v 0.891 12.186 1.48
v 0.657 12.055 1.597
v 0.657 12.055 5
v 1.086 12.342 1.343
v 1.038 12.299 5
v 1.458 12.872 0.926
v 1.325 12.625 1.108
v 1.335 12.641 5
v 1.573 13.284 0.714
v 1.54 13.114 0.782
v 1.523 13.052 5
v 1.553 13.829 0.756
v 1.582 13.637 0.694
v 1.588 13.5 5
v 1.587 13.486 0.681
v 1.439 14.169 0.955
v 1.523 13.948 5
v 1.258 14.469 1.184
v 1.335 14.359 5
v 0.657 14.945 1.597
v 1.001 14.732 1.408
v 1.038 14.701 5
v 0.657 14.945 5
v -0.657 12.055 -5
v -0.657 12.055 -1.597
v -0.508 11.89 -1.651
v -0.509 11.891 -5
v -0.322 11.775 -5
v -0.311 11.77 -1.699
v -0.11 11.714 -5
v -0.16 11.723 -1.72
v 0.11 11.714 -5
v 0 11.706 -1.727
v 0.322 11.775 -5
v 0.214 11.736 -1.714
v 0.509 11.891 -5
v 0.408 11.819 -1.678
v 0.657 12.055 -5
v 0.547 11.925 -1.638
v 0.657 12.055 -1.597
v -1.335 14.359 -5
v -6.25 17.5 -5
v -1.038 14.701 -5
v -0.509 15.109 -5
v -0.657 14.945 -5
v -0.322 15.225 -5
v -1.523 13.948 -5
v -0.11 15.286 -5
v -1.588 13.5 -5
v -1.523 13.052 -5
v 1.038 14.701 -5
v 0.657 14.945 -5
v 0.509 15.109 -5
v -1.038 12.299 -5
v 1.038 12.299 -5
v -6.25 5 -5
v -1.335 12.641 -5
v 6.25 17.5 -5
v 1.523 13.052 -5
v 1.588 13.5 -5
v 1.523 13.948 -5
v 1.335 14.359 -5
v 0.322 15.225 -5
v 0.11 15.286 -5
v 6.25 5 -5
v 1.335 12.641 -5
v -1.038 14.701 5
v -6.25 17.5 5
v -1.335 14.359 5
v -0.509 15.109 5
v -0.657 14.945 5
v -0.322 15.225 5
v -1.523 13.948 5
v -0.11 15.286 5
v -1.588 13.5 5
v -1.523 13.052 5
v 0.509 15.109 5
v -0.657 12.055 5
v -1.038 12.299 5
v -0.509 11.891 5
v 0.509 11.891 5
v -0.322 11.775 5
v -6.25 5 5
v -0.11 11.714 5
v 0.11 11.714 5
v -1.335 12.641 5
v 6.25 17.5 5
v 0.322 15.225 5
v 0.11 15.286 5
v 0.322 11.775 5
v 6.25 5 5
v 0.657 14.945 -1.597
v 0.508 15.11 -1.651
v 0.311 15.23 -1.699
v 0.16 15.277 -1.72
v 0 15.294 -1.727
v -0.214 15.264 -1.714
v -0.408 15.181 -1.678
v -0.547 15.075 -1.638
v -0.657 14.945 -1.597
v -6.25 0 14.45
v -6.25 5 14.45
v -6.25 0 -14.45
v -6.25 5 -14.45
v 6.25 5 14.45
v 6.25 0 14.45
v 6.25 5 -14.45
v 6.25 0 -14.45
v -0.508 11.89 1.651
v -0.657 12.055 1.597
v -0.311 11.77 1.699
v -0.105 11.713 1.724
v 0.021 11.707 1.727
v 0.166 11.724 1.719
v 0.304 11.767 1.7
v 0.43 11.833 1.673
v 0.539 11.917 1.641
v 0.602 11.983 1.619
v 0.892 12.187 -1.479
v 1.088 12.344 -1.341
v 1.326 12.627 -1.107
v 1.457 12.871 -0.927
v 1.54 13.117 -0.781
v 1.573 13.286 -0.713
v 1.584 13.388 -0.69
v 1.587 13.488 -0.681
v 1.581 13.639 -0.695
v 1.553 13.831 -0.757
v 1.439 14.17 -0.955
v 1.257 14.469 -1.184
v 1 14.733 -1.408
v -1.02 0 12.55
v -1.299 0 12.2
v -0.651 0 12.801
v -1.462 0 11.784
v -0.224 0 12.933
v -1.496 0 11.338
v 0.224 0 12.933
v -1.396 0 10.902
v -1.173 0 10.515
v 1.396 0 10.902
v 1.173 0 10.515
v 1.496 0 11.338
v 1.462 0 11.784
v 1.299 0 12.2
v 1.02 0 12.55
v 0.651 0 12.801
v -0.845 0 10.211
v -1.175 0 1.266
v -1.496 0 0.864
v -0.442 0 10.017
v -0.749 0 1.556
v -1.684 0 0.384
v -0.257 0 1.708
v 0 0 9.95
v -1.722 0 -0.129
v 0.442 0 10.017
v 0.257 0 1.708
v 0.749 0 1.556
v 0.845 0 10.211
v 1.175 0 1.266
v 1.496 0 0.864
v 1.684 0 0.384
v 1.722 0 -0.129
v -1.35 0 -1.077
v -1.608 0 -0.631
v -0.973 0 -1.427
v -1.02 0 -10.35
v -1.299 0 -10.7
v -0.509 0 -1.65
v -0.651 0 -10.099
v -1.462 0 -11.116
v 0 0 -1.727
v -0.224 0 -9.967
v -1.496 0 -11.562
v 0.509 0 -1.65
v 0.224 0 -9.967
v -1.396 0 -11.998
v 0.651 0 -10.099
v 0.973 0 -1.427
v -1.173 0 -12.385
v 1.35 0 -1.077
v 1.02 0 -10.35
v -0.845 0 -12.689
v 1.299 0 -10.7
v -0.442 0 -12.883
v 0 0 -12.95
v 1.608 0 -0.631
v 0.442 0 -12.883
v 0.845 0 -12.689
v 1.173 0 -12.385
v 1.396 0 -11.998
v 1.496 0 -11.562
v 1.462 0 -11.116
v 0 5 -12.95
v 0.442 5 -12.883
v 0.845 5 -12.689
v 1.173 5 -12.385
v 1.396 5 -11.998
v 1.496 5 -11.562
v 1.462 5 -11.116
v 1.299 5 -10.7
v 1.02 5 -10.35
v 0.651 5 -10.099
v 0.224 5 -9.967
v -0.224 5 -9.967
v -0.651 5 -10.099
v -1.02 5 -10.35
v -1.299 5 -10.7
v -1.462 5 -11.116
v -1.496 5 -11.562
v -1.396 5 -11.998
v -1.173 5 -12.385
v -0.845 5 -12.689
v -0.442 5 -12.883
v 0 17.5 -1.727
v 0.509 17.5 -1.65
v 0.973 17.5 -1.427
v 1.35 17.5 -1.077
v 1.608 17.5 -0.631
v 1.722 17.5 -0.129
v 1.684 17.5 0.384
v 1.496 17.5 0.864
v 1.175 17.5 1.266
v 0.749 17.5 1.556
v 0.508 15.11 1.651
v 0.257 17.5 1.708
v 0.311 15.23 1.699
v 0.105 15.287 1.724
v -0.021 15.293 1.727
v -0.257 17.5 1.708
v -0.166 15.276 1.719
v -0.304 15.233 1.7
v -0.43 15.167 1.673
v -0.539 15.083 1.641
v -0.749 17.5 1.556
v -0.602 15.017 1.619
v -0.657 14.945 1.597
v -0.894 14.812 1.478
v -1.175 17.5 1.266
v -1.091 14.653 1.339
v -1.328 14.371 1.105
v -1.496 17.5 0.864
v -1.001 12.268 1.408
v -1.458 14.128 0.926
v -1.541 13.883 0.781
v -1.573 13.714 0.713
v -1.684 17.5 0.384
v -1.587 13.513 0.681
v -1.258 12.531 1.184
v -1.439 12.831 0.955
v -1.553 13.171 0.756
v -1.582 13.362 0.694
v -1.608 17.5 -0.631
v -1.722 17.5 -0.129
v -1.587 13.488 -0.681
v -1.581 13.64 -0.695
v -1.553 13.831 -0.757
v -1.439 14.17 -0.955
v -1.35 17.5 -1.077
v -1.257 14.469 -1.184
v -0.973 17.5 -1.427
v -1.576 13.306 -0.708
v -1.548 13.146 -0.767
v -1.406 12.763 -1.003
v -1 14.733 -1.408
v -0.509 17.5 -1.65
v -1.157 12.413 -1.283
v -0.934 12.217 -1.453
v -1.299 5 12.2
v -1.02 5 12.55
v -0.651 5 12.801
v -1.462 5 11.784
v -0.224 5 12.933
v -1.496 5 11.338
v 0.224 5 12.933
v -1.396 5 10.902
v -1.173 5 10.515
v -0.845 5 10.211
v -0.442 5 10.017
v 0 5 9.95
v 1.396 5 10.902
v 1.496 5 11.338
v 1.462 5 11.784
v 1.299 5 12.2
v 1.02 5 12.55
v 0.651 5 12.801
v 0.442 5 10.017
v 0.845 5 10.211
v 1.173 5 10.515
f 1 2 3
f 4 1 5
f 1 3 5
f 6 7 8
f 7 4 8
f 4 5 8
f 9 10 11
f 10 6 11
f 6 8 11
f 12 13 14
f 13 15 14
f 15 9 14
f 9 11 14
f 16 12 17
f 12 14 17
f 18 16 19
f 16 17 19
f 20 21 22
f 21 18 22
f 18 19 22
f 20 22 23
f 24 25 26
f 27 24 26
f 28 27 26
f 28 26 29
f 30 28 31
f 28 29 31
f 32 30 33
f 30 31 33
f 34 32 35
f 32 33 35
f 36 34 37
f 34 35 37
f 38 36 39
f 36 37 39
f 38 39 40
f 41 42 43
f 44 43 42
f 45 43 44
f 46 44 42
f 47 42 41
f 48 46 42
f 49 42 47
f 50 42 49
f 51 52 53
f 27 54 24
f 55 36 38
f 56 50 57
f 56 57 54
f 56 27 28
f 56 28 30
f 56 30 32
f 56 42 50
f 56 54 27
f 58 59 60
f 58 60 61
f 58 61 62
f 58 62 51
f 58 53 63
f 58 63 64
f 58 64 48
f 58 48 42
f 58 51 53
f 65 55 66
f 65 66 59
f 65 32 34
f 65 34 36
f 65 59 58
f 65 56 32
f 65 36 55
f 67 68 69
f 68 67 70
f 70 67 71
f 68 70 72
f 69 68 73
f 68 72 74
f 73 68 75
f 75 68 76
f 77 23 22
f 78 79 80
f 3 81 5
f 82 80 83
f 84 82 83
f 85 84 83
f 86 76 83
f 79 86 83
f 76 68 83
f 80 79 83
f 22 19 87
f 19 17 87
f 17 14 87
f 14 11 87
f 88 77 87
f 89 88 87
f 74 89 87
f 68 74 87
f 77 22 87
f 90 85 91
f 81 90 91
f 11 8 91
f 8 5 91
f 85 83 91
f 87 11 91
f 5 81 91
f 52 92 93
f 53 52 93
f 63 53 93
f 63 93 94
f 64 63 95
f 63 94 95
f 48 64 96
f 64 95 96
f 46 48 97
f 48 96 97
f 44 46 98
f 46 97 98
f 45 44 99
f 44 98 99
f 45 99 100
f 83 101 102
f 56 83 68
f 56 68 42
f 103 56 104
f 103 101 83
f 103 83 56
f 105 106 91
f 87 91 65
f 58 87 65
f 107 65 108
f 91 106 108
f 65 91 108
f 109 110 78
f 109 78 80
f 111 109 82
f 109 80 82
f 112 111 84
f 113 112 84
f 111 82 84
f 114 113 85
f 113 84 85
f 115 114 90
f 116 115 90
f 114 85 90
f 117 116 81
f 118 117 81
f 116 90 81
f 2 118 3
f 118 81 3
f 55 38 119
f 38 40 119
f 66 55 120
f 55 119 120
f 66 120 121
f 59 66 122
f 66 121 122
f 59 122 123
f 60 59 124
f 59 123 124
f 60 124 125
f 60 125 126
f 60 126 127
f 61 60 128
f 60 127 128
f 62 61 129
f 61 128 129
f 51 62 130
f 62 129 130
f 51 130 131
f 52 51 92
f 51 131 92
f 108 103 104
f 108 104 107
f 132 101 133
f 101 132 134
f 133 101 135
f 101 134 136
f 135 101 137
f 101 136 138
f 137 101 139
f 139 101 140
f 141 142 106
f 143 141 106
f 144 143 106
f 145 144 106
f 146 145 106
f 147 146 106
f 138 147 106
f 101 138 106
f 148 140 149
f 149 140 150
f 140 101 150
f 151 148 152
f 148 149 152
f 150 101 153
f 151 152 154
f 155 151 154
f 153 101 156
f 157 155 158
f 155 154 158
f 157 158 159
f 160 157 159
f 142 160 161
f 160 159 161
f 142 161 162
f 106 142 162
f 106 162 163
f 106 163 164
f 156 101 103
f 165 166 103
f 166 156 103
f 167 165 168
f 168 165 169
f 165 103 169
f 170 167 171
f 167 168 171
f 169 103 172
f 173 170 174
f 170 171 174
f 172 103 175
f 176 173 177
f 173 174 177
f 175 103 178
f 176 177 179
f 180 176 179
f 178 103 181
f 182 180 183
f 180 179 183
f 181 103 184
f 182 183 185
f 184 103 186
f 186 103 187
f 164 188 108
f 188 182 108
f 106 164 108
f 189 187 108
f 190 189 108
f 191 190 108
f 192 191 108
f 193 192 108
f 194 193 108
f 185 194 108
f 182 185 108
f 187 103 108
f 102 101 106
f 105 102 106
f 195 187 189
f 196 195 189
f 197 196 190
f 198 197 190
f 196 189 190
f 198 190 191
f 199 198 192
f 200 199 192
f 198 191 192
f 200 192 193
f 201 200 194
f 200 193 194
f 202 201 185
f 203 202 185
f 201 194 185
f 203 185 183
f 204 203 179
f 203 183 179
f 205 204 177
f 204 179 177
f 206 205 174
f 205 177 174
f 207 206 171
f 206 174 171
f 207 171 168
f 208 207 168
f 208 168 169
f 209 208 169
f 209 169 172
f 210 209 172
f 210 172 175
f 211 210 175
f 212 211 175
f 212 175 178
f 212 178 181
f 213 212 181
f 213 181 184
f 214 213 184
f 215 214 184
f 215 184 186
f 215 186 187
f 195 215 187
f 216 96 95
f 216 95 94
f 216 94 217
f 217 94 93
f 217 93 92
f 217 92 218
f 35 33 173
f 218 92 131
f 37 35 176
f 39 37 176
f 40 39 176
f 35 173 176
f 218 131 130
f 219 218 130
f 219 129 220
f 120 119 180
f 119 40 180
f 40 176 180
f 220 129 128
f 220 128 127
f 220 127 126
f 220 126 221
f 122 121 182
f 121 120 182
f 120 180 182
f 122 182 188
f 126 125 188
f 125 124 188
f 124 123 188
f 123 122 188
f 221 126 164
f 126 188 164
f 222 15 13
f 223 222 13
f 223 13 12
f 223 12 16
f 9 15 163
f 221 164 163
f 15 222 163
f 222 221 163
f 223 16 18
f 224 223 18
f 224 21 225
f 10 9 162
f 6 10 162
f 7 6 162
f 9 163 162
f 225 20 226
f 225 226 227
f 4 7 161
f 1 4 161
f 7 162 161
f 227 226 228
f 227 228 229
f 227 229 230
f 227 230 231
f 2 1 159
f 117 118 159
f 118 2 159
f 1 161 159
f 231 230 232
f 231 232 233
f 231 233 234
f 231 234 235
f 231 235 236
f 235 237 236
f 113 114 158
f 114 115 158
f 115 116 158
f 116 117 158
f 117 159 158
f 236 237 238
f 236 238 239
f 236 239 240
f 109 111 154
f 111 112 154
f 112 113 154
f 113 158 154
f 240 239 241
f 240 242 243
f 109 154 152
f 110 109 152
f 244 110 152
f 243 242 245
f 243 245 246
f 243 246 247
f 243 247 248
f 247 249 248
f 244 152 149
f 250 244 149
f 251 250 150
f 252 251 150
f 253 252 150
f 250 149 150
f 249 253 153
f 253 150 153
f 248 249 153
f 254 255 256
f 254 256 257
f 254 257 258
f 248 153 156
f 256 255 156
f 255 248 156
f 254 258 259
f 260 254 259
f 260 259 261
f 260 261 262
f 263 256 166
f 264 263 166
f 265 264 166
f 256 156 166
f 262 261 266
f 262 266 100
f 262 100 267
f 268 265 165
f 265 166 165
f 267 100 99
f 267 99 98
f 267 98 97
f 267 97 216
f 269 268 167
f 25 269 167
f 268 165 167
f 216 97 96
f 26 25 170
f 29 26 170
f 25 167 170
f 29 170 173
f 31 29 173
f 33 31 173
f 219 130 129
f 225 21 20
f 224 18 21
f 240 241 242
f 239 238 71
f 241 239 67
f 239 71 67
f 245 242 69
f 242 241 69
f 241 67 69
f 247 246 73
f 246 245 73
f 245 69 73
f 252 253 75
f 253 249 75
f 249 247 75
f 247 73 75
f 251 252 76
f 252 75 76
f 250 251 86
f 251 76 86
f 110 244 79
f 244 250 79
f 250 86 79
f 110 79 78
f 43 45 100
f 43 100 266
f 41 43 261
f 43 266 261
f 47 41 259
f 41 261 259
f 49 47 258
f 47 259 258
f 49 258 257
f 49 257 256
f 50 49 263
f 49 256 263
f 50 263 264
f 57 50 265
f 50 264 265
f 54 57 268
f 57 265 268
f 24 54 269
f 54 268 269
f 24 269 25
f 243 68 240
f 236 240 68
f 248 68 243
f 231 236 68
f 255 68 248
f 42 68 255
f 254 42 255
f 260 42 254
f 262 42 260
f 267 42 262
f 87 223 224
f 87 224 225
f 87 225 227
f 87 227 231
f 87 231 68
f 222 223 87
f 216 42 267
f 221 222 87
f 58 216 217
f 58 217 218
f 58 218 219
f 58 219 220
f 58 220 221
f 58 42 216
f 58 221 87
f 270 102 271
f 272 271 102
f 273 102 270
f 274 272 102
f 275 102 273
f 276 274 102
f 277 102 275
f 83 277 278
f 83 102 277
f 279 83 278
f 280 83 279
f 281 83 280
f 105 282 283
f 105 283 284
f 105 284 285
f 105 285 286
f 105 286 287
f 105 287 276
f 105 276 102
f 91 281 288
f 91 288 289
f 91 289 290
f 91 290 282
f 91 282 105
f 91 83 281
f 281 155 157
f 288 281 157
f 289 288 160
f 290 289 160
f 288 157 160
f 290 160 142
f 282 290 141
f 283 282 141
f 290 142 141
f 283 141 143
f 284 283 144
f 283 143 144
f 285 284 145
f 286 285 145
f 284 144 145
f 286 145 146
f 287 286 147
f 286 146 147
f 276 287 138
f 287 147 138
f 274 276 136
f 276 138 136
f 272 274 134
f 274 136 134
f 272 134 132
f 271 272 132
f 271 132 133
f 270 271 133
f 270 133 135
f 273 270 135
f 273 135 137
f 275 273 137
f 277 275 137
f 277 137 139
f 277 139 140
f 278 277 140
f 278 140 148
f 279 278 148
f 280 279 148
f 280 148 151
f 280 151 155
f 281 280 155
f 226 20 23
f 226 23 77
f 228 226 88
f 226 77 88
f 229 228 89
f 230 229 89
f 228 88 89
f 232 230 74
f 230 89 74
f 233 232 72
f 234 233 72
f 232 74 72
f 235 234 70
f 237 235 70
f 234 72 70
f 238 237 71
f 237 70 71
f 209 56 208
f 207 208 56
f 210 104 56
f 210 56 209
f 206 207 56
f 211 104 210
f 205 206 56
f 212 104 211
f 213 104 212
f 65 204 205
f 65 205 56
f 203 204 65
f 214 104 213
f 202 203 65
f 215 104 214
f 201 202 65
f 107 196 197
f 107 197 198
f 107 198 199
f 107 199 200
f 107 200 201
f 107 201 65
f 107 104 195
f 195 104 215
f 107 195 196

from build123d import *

# Parameters (mm, degrees)
SKETCH1_W                          = 12.5
SKETCH1_H                          = 28.9
EXTRUDE1_DEPTH                     = 5
F_3_0_3_DIAMETER_HOLE1_D           = 3
SKETCH5_W                          = 12.5
SKETCH5_H                          = 10
EXTRUDE3_DEPTH                     = 12.5
F_1_8_0_125_DIAMETER_HOLE1_D       = 3.175
F_8_32_TAPPED_HOLE1_D              = 3.4544
F_8_32_TAPPED_HOLE1_ON_FACE_2_D    = 3.4544
F_1_16_0_0625_DIAMETER_HOLE2_D     = 1.5875
F_1_16_0_0625_DIAMETER_HOLE2_DEPTH = 19.45
F_1_16_0_0625_DIAMETER_HOLE2_TIP   = 0.476933116


with BuildPart() as part:
    # Sketch1 → Extrude1 (new body)
    with BuildSketch(Plane(origin=(0, 0, 0), x_dir=(1, 0, 0), z_dir=(0, 1, 0))):
        Rectangle(SKETCH1_W, SKETCH1_H)
    extrude(amount=EXTRUDE1_DEPTH)

    # Ø3.0 (3) Diameter Hole1 (through all)
    with Locations(Plane(origin=(0, 5, -11.45), x_dir=(0, 0, 1), z_dir=(0, 1, 0))):
        with Locations((0, 0), (22.9, 0)):
            Hole(F_3_0_3_DIAMETER_HOLE1_D / 2)

    # Sketch5 → Extrude3 (add)
    with BuildSketch(Plane(origin=(0, 5, 0), x_dir=(1, 0, 0), z_dir=(0, 1, 0))):
        Rectangle(SKETCH5_W, SKETCH5_H)
    extrude(amount=EXTRUDE3_DEPTH)

    # 1/8 (0.125) Diameter Hole1 (through all)
    with Locations(Plane(origin=(0, 13.5, -5), x_dir=(-1, 0, 0), z_dir=(0, 0, -1))):
        with Locations((0, 0)):
            Hole(F_1_8_0_125_DIAMETER_HOLE1_D / 2)

    # #8-32 Tapped Hole1 (through all)
    with Locations(Plane.ZX.offset(17.5)):
        with Locations((0, 0)):
            Hole(F_8_32_TAPPED_HOLE1_D / 2)

    # #8-32 Tapped Hole1 on face 2 (through all)
    with Locations(Plane(origin=(0, 0, 0), x_dir=(0, 0, -1), z_dir=(0, -1, 0))):
        with Locations((0, 0)):
            Hole(F_8_32_TAPPED_HOLE1_ON_FACE_2_D / 2)

    # 1/16 (0.0625) Diameter Hole2
    with Locations(Plane(origin=(0, 14.5, -5), x_dir=(-1, 0, 0), z_dir=(0, 0, -1))):
        with Locations((0, 0), (0, -2)):
            Hole(F_1_16_0_0625_DIAMETER_HOLE2_D / 2, depth=F_1_16_0_0625_DIAMETER_HOLE2_DEPTH)
            with Locations((0, 0, -(F_1_16_0_0625_DIAMETER_HOLE2_DEPTH + F_1_16_0_0625_DIAMETER_HOLE2_TIP / 2))):  # 118° drill point
                Cone(0, F_1_16_0_0625_DIAMETER_HOLE2_D / 2, F_1_16_0_0625_DIAMETER_HOLE2_TIP, mode=Mode.SUBTRACT)


solid = part.part
